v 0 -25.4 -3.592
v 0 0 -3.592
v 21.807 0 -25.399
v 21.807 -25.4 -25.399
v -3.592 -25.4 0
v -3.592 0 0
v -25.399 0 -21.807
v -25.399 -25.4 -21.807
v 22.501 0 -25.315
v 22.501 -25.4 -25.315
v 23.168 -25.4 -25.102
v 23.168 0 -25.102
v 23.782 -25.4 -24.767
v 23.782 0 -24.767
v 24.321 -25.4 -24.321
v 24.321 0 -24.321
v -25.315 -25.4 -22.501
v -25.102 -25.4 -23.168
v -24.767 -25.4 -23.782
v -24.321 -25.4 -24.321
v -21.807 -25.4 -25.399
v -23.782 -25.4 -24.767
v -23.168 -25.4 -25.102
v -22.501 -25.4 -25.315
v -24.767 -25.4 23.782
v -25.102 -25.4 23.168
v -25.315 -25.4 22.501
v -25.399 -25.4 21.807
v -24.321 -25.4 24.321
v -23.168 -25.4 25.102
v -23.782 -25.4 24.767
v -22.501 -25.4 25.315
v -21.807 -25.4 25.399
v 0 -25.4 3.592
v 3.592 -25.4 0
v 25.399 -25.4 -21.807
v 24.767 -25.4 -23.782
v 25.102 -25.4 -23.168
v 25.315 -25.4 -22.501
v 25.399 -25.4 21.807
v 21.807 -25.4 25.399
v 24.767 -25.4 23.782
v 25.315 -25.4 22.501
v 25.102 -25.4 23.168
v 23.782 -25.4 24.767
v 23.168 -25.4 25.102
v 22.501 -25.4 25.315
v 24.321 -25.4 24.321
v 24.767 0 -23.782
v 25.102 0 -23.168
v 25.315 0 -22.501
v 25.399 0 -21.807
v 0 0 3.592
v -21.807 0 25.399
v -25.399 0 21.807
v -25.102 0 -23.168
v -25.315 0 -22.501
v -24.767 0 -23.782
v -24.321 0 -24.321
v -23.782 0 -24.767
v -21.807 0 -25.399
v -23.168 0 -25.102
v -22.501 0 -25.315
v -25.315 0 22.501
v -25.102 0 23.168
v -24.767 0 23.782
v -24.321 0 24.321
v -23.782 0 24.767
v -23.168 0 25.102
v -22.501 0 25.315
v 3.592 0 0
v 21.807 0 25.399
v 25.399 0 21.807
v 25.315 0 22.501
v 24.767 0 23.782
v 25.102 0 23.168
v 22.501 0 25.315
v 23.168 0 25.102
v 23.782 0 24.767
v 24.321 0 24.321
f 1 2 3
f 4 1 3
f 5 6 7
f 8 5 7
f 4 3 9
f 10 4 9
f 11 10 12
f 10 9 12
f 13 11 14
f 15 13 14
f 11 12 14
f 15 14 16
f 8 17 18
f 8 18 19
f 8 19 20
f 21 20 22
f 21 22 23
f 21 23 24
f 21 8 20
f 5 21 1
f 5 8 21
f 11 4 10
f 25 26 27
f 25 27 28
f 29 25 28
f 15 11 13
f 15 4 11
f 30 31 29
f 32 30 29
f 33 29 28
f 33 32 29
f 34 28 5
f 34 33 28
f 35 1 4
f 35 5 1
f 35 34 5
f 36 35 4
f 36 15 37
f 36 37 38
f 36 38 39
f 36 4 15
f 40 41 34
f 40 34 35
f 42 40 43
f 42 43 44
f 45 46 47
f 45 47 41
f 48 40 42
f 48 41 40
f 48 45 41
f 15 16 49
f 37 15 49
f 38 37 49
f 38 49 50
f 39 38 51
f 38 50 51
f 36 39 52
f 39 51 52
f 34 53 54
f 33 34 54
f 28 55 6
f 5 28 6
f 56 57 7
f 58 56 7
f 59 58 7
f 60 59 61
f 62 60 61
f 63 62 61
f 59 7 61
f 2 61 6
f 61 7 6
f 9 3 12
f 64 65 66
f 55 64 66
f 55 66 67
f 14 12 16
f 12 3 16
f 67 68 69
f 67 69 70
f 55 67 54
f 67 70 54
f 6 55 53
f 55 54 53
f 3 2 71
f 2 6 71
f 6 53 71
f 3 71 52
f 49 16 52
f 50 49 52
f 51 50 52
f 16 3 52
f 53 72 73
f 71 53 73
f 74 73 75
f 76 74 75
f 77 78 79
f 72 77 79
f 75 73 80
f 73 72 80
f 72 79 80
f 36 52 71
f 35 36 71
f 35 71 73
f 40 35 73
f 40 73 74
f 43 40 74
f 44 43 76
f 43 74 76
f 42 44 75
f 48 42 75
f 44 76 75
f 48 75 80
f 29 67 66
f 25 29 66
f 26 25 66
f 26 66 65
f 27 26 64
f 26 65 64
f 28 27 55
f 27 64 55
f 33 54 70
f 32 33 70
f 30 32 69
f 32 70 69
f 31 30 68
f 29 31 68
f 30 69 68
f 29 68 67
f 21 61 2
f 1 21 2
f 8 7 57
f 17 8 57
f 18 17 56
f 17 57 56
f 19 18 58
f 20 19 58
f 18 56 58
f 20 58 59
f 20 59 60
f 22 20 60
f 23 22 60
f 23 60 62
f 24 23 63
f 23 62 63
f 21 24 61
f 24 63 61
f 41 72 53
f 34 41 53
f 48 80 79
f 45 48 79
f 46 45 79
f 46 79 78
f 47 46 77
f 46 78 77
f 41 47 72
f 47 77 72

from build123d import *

# Parameters (mm, degrees)
F1_DEPTH = 25.4


with BuildPart() as f1:
    # F0 (on Front) → F1 (new body)
    with BuildSketch(Plane.XZ):
        with BuildLine():
            Line((-1.7960512242, 1.7960512242), (-24.3212742751, 24.3212742751))
            ThreePointArc((-24.3212742751, 24.3212742751), (-25.1022111456, 23.1678047767), (-25.3989050096, 21.8068025612))
            Line((-25.3989050096, 21.8068025612), (-3.5921024484, 0))
            Line((-3.5921024484, 0), (-1.7960512242, 1.7960512242))
        make_face()
        with BuildLine():
            Line((0, 3.5921024484), (-21.8068025612, 25.3989050096))
            ThreePointArc((-21.8068025612, 25.3989050096), (-23.1678047767, 25.1022111456), (-24.3212742751, 24.3212742751))
            Line((-24.3212742751, 24.3212742751), (-1.7960512242, 1.7960512242))
            Line((-1.7960512242, 1.7960512242), (0, 3.5921024484))
        make_face()
        Polygon((0, 0), (-1.7960512242, 1.7960512242), (-3.5921024484, 0), (-1.7960512242, -1.7960512242), align=None)
        Polygon((1.7960512242, 1.7960512242), (0, 3.5921024484), (-1.7960512242, 1.7960512242), (0, 0), align=None)
        Polygon((3.5921024484, 0), (1.7960512242, 1.7960512242), (0, 0), (1.7960512242, -1.7960512242), align=None)
        Polygon((1.7960512242, -1.7960512242), (0, 0), (-1.7960512242, -1.7960512242), (0, -3.5921024484), align=None)
        with BuildLine():
            ThreePointArc((24.3212742751, 24.3212742751), (23.1678047767, 25.1022111456), (21.8068025612, 25.3989050096))
            Line((21.8068025612, 25.3989050096), (0, 3.5921024484))
            Line((0, 3.5921024484), (1.7960512242, 1.7960512242))
            Line((1.7960512242, 1.7960512242), (24.3212742751, 24.3212742751))
        make_face()
        with BuildLine():
            ThreePointArc((25.3989050096, 21.8068025612), (25.1022111456, 23.1678047767), (24.3212742751, 24.3212742751))
            Line((24.3212742751, 24.3212742751), (1.7960512242, 1.7960512242))
            Line((1.7960512242, 1.7960512242), (3.5921024484, 0))
            Line((3.5921024484, 0), (25.3989050096, 21.8068025612))
        make_face()
        with BuildLine():
            Line((25.3989050096, -21.8068025612), (3.5921024484, 0))
            Line((3.5921024484, 0), (1.7960512242, -1.7960512242))
            Line((1.7960512242, -1.7960512242), (24.3212742751, -24.3212742751))
            ThreePointArc((24.3212742751, -24.3212742751), (25.1022111456, -23.1678047767), (25.3989050096, -21.8068025612))
        make_face()
        with BuildLine():
            Line((-1.7960512242, -1.7960512242), (-3.5921024484, 0))
            Line((-3.5921024484, 0), (-25.3989050096, -21.8068025612))
            ThreePointArc((-25.3989050096, -21.8068025612), (-25.1022111456, -23.1678047767), (-24.3212742751, -24.3212742751))
            Line((-24.3212742751, -24.3212742751), (-1.7960512242, -1.7960512242))
        make_face()
        with BuildLine():
            Line((0, -3.5921024484), (-1.7960512242, -1.7960512242))
            Line((-1.7960512242, -1.7960512242), (-24.3212742751, -24.3212742751))
            ThreePointArc((-24.3212742751, -24.3212742751), (-23.1678047767, -25.1022111456), (-21.8068025612, -25.3989050096))
            Line((-21.8068025612, -25.3989050096), (0, -3.5921024484))
        make_face()
        with BuildLine():
            Line((24.3212742751, -24.3212742751), (1.7960512242, -1.7960512242))
            Line((1.7960512242, -1.7960512242), (0, -3.5921024484))
            Line((0, -3.5921024484), (21.8068025612, -25.3989050096))
            ThreePointArc((21.8068025612, -25.3989050096), (23.1678047767, -25.1022111456), (24.3212742751, -24.3212742751))
        make_face()
    extrude(amount=F1_DEPTH)


solid = f1.part
